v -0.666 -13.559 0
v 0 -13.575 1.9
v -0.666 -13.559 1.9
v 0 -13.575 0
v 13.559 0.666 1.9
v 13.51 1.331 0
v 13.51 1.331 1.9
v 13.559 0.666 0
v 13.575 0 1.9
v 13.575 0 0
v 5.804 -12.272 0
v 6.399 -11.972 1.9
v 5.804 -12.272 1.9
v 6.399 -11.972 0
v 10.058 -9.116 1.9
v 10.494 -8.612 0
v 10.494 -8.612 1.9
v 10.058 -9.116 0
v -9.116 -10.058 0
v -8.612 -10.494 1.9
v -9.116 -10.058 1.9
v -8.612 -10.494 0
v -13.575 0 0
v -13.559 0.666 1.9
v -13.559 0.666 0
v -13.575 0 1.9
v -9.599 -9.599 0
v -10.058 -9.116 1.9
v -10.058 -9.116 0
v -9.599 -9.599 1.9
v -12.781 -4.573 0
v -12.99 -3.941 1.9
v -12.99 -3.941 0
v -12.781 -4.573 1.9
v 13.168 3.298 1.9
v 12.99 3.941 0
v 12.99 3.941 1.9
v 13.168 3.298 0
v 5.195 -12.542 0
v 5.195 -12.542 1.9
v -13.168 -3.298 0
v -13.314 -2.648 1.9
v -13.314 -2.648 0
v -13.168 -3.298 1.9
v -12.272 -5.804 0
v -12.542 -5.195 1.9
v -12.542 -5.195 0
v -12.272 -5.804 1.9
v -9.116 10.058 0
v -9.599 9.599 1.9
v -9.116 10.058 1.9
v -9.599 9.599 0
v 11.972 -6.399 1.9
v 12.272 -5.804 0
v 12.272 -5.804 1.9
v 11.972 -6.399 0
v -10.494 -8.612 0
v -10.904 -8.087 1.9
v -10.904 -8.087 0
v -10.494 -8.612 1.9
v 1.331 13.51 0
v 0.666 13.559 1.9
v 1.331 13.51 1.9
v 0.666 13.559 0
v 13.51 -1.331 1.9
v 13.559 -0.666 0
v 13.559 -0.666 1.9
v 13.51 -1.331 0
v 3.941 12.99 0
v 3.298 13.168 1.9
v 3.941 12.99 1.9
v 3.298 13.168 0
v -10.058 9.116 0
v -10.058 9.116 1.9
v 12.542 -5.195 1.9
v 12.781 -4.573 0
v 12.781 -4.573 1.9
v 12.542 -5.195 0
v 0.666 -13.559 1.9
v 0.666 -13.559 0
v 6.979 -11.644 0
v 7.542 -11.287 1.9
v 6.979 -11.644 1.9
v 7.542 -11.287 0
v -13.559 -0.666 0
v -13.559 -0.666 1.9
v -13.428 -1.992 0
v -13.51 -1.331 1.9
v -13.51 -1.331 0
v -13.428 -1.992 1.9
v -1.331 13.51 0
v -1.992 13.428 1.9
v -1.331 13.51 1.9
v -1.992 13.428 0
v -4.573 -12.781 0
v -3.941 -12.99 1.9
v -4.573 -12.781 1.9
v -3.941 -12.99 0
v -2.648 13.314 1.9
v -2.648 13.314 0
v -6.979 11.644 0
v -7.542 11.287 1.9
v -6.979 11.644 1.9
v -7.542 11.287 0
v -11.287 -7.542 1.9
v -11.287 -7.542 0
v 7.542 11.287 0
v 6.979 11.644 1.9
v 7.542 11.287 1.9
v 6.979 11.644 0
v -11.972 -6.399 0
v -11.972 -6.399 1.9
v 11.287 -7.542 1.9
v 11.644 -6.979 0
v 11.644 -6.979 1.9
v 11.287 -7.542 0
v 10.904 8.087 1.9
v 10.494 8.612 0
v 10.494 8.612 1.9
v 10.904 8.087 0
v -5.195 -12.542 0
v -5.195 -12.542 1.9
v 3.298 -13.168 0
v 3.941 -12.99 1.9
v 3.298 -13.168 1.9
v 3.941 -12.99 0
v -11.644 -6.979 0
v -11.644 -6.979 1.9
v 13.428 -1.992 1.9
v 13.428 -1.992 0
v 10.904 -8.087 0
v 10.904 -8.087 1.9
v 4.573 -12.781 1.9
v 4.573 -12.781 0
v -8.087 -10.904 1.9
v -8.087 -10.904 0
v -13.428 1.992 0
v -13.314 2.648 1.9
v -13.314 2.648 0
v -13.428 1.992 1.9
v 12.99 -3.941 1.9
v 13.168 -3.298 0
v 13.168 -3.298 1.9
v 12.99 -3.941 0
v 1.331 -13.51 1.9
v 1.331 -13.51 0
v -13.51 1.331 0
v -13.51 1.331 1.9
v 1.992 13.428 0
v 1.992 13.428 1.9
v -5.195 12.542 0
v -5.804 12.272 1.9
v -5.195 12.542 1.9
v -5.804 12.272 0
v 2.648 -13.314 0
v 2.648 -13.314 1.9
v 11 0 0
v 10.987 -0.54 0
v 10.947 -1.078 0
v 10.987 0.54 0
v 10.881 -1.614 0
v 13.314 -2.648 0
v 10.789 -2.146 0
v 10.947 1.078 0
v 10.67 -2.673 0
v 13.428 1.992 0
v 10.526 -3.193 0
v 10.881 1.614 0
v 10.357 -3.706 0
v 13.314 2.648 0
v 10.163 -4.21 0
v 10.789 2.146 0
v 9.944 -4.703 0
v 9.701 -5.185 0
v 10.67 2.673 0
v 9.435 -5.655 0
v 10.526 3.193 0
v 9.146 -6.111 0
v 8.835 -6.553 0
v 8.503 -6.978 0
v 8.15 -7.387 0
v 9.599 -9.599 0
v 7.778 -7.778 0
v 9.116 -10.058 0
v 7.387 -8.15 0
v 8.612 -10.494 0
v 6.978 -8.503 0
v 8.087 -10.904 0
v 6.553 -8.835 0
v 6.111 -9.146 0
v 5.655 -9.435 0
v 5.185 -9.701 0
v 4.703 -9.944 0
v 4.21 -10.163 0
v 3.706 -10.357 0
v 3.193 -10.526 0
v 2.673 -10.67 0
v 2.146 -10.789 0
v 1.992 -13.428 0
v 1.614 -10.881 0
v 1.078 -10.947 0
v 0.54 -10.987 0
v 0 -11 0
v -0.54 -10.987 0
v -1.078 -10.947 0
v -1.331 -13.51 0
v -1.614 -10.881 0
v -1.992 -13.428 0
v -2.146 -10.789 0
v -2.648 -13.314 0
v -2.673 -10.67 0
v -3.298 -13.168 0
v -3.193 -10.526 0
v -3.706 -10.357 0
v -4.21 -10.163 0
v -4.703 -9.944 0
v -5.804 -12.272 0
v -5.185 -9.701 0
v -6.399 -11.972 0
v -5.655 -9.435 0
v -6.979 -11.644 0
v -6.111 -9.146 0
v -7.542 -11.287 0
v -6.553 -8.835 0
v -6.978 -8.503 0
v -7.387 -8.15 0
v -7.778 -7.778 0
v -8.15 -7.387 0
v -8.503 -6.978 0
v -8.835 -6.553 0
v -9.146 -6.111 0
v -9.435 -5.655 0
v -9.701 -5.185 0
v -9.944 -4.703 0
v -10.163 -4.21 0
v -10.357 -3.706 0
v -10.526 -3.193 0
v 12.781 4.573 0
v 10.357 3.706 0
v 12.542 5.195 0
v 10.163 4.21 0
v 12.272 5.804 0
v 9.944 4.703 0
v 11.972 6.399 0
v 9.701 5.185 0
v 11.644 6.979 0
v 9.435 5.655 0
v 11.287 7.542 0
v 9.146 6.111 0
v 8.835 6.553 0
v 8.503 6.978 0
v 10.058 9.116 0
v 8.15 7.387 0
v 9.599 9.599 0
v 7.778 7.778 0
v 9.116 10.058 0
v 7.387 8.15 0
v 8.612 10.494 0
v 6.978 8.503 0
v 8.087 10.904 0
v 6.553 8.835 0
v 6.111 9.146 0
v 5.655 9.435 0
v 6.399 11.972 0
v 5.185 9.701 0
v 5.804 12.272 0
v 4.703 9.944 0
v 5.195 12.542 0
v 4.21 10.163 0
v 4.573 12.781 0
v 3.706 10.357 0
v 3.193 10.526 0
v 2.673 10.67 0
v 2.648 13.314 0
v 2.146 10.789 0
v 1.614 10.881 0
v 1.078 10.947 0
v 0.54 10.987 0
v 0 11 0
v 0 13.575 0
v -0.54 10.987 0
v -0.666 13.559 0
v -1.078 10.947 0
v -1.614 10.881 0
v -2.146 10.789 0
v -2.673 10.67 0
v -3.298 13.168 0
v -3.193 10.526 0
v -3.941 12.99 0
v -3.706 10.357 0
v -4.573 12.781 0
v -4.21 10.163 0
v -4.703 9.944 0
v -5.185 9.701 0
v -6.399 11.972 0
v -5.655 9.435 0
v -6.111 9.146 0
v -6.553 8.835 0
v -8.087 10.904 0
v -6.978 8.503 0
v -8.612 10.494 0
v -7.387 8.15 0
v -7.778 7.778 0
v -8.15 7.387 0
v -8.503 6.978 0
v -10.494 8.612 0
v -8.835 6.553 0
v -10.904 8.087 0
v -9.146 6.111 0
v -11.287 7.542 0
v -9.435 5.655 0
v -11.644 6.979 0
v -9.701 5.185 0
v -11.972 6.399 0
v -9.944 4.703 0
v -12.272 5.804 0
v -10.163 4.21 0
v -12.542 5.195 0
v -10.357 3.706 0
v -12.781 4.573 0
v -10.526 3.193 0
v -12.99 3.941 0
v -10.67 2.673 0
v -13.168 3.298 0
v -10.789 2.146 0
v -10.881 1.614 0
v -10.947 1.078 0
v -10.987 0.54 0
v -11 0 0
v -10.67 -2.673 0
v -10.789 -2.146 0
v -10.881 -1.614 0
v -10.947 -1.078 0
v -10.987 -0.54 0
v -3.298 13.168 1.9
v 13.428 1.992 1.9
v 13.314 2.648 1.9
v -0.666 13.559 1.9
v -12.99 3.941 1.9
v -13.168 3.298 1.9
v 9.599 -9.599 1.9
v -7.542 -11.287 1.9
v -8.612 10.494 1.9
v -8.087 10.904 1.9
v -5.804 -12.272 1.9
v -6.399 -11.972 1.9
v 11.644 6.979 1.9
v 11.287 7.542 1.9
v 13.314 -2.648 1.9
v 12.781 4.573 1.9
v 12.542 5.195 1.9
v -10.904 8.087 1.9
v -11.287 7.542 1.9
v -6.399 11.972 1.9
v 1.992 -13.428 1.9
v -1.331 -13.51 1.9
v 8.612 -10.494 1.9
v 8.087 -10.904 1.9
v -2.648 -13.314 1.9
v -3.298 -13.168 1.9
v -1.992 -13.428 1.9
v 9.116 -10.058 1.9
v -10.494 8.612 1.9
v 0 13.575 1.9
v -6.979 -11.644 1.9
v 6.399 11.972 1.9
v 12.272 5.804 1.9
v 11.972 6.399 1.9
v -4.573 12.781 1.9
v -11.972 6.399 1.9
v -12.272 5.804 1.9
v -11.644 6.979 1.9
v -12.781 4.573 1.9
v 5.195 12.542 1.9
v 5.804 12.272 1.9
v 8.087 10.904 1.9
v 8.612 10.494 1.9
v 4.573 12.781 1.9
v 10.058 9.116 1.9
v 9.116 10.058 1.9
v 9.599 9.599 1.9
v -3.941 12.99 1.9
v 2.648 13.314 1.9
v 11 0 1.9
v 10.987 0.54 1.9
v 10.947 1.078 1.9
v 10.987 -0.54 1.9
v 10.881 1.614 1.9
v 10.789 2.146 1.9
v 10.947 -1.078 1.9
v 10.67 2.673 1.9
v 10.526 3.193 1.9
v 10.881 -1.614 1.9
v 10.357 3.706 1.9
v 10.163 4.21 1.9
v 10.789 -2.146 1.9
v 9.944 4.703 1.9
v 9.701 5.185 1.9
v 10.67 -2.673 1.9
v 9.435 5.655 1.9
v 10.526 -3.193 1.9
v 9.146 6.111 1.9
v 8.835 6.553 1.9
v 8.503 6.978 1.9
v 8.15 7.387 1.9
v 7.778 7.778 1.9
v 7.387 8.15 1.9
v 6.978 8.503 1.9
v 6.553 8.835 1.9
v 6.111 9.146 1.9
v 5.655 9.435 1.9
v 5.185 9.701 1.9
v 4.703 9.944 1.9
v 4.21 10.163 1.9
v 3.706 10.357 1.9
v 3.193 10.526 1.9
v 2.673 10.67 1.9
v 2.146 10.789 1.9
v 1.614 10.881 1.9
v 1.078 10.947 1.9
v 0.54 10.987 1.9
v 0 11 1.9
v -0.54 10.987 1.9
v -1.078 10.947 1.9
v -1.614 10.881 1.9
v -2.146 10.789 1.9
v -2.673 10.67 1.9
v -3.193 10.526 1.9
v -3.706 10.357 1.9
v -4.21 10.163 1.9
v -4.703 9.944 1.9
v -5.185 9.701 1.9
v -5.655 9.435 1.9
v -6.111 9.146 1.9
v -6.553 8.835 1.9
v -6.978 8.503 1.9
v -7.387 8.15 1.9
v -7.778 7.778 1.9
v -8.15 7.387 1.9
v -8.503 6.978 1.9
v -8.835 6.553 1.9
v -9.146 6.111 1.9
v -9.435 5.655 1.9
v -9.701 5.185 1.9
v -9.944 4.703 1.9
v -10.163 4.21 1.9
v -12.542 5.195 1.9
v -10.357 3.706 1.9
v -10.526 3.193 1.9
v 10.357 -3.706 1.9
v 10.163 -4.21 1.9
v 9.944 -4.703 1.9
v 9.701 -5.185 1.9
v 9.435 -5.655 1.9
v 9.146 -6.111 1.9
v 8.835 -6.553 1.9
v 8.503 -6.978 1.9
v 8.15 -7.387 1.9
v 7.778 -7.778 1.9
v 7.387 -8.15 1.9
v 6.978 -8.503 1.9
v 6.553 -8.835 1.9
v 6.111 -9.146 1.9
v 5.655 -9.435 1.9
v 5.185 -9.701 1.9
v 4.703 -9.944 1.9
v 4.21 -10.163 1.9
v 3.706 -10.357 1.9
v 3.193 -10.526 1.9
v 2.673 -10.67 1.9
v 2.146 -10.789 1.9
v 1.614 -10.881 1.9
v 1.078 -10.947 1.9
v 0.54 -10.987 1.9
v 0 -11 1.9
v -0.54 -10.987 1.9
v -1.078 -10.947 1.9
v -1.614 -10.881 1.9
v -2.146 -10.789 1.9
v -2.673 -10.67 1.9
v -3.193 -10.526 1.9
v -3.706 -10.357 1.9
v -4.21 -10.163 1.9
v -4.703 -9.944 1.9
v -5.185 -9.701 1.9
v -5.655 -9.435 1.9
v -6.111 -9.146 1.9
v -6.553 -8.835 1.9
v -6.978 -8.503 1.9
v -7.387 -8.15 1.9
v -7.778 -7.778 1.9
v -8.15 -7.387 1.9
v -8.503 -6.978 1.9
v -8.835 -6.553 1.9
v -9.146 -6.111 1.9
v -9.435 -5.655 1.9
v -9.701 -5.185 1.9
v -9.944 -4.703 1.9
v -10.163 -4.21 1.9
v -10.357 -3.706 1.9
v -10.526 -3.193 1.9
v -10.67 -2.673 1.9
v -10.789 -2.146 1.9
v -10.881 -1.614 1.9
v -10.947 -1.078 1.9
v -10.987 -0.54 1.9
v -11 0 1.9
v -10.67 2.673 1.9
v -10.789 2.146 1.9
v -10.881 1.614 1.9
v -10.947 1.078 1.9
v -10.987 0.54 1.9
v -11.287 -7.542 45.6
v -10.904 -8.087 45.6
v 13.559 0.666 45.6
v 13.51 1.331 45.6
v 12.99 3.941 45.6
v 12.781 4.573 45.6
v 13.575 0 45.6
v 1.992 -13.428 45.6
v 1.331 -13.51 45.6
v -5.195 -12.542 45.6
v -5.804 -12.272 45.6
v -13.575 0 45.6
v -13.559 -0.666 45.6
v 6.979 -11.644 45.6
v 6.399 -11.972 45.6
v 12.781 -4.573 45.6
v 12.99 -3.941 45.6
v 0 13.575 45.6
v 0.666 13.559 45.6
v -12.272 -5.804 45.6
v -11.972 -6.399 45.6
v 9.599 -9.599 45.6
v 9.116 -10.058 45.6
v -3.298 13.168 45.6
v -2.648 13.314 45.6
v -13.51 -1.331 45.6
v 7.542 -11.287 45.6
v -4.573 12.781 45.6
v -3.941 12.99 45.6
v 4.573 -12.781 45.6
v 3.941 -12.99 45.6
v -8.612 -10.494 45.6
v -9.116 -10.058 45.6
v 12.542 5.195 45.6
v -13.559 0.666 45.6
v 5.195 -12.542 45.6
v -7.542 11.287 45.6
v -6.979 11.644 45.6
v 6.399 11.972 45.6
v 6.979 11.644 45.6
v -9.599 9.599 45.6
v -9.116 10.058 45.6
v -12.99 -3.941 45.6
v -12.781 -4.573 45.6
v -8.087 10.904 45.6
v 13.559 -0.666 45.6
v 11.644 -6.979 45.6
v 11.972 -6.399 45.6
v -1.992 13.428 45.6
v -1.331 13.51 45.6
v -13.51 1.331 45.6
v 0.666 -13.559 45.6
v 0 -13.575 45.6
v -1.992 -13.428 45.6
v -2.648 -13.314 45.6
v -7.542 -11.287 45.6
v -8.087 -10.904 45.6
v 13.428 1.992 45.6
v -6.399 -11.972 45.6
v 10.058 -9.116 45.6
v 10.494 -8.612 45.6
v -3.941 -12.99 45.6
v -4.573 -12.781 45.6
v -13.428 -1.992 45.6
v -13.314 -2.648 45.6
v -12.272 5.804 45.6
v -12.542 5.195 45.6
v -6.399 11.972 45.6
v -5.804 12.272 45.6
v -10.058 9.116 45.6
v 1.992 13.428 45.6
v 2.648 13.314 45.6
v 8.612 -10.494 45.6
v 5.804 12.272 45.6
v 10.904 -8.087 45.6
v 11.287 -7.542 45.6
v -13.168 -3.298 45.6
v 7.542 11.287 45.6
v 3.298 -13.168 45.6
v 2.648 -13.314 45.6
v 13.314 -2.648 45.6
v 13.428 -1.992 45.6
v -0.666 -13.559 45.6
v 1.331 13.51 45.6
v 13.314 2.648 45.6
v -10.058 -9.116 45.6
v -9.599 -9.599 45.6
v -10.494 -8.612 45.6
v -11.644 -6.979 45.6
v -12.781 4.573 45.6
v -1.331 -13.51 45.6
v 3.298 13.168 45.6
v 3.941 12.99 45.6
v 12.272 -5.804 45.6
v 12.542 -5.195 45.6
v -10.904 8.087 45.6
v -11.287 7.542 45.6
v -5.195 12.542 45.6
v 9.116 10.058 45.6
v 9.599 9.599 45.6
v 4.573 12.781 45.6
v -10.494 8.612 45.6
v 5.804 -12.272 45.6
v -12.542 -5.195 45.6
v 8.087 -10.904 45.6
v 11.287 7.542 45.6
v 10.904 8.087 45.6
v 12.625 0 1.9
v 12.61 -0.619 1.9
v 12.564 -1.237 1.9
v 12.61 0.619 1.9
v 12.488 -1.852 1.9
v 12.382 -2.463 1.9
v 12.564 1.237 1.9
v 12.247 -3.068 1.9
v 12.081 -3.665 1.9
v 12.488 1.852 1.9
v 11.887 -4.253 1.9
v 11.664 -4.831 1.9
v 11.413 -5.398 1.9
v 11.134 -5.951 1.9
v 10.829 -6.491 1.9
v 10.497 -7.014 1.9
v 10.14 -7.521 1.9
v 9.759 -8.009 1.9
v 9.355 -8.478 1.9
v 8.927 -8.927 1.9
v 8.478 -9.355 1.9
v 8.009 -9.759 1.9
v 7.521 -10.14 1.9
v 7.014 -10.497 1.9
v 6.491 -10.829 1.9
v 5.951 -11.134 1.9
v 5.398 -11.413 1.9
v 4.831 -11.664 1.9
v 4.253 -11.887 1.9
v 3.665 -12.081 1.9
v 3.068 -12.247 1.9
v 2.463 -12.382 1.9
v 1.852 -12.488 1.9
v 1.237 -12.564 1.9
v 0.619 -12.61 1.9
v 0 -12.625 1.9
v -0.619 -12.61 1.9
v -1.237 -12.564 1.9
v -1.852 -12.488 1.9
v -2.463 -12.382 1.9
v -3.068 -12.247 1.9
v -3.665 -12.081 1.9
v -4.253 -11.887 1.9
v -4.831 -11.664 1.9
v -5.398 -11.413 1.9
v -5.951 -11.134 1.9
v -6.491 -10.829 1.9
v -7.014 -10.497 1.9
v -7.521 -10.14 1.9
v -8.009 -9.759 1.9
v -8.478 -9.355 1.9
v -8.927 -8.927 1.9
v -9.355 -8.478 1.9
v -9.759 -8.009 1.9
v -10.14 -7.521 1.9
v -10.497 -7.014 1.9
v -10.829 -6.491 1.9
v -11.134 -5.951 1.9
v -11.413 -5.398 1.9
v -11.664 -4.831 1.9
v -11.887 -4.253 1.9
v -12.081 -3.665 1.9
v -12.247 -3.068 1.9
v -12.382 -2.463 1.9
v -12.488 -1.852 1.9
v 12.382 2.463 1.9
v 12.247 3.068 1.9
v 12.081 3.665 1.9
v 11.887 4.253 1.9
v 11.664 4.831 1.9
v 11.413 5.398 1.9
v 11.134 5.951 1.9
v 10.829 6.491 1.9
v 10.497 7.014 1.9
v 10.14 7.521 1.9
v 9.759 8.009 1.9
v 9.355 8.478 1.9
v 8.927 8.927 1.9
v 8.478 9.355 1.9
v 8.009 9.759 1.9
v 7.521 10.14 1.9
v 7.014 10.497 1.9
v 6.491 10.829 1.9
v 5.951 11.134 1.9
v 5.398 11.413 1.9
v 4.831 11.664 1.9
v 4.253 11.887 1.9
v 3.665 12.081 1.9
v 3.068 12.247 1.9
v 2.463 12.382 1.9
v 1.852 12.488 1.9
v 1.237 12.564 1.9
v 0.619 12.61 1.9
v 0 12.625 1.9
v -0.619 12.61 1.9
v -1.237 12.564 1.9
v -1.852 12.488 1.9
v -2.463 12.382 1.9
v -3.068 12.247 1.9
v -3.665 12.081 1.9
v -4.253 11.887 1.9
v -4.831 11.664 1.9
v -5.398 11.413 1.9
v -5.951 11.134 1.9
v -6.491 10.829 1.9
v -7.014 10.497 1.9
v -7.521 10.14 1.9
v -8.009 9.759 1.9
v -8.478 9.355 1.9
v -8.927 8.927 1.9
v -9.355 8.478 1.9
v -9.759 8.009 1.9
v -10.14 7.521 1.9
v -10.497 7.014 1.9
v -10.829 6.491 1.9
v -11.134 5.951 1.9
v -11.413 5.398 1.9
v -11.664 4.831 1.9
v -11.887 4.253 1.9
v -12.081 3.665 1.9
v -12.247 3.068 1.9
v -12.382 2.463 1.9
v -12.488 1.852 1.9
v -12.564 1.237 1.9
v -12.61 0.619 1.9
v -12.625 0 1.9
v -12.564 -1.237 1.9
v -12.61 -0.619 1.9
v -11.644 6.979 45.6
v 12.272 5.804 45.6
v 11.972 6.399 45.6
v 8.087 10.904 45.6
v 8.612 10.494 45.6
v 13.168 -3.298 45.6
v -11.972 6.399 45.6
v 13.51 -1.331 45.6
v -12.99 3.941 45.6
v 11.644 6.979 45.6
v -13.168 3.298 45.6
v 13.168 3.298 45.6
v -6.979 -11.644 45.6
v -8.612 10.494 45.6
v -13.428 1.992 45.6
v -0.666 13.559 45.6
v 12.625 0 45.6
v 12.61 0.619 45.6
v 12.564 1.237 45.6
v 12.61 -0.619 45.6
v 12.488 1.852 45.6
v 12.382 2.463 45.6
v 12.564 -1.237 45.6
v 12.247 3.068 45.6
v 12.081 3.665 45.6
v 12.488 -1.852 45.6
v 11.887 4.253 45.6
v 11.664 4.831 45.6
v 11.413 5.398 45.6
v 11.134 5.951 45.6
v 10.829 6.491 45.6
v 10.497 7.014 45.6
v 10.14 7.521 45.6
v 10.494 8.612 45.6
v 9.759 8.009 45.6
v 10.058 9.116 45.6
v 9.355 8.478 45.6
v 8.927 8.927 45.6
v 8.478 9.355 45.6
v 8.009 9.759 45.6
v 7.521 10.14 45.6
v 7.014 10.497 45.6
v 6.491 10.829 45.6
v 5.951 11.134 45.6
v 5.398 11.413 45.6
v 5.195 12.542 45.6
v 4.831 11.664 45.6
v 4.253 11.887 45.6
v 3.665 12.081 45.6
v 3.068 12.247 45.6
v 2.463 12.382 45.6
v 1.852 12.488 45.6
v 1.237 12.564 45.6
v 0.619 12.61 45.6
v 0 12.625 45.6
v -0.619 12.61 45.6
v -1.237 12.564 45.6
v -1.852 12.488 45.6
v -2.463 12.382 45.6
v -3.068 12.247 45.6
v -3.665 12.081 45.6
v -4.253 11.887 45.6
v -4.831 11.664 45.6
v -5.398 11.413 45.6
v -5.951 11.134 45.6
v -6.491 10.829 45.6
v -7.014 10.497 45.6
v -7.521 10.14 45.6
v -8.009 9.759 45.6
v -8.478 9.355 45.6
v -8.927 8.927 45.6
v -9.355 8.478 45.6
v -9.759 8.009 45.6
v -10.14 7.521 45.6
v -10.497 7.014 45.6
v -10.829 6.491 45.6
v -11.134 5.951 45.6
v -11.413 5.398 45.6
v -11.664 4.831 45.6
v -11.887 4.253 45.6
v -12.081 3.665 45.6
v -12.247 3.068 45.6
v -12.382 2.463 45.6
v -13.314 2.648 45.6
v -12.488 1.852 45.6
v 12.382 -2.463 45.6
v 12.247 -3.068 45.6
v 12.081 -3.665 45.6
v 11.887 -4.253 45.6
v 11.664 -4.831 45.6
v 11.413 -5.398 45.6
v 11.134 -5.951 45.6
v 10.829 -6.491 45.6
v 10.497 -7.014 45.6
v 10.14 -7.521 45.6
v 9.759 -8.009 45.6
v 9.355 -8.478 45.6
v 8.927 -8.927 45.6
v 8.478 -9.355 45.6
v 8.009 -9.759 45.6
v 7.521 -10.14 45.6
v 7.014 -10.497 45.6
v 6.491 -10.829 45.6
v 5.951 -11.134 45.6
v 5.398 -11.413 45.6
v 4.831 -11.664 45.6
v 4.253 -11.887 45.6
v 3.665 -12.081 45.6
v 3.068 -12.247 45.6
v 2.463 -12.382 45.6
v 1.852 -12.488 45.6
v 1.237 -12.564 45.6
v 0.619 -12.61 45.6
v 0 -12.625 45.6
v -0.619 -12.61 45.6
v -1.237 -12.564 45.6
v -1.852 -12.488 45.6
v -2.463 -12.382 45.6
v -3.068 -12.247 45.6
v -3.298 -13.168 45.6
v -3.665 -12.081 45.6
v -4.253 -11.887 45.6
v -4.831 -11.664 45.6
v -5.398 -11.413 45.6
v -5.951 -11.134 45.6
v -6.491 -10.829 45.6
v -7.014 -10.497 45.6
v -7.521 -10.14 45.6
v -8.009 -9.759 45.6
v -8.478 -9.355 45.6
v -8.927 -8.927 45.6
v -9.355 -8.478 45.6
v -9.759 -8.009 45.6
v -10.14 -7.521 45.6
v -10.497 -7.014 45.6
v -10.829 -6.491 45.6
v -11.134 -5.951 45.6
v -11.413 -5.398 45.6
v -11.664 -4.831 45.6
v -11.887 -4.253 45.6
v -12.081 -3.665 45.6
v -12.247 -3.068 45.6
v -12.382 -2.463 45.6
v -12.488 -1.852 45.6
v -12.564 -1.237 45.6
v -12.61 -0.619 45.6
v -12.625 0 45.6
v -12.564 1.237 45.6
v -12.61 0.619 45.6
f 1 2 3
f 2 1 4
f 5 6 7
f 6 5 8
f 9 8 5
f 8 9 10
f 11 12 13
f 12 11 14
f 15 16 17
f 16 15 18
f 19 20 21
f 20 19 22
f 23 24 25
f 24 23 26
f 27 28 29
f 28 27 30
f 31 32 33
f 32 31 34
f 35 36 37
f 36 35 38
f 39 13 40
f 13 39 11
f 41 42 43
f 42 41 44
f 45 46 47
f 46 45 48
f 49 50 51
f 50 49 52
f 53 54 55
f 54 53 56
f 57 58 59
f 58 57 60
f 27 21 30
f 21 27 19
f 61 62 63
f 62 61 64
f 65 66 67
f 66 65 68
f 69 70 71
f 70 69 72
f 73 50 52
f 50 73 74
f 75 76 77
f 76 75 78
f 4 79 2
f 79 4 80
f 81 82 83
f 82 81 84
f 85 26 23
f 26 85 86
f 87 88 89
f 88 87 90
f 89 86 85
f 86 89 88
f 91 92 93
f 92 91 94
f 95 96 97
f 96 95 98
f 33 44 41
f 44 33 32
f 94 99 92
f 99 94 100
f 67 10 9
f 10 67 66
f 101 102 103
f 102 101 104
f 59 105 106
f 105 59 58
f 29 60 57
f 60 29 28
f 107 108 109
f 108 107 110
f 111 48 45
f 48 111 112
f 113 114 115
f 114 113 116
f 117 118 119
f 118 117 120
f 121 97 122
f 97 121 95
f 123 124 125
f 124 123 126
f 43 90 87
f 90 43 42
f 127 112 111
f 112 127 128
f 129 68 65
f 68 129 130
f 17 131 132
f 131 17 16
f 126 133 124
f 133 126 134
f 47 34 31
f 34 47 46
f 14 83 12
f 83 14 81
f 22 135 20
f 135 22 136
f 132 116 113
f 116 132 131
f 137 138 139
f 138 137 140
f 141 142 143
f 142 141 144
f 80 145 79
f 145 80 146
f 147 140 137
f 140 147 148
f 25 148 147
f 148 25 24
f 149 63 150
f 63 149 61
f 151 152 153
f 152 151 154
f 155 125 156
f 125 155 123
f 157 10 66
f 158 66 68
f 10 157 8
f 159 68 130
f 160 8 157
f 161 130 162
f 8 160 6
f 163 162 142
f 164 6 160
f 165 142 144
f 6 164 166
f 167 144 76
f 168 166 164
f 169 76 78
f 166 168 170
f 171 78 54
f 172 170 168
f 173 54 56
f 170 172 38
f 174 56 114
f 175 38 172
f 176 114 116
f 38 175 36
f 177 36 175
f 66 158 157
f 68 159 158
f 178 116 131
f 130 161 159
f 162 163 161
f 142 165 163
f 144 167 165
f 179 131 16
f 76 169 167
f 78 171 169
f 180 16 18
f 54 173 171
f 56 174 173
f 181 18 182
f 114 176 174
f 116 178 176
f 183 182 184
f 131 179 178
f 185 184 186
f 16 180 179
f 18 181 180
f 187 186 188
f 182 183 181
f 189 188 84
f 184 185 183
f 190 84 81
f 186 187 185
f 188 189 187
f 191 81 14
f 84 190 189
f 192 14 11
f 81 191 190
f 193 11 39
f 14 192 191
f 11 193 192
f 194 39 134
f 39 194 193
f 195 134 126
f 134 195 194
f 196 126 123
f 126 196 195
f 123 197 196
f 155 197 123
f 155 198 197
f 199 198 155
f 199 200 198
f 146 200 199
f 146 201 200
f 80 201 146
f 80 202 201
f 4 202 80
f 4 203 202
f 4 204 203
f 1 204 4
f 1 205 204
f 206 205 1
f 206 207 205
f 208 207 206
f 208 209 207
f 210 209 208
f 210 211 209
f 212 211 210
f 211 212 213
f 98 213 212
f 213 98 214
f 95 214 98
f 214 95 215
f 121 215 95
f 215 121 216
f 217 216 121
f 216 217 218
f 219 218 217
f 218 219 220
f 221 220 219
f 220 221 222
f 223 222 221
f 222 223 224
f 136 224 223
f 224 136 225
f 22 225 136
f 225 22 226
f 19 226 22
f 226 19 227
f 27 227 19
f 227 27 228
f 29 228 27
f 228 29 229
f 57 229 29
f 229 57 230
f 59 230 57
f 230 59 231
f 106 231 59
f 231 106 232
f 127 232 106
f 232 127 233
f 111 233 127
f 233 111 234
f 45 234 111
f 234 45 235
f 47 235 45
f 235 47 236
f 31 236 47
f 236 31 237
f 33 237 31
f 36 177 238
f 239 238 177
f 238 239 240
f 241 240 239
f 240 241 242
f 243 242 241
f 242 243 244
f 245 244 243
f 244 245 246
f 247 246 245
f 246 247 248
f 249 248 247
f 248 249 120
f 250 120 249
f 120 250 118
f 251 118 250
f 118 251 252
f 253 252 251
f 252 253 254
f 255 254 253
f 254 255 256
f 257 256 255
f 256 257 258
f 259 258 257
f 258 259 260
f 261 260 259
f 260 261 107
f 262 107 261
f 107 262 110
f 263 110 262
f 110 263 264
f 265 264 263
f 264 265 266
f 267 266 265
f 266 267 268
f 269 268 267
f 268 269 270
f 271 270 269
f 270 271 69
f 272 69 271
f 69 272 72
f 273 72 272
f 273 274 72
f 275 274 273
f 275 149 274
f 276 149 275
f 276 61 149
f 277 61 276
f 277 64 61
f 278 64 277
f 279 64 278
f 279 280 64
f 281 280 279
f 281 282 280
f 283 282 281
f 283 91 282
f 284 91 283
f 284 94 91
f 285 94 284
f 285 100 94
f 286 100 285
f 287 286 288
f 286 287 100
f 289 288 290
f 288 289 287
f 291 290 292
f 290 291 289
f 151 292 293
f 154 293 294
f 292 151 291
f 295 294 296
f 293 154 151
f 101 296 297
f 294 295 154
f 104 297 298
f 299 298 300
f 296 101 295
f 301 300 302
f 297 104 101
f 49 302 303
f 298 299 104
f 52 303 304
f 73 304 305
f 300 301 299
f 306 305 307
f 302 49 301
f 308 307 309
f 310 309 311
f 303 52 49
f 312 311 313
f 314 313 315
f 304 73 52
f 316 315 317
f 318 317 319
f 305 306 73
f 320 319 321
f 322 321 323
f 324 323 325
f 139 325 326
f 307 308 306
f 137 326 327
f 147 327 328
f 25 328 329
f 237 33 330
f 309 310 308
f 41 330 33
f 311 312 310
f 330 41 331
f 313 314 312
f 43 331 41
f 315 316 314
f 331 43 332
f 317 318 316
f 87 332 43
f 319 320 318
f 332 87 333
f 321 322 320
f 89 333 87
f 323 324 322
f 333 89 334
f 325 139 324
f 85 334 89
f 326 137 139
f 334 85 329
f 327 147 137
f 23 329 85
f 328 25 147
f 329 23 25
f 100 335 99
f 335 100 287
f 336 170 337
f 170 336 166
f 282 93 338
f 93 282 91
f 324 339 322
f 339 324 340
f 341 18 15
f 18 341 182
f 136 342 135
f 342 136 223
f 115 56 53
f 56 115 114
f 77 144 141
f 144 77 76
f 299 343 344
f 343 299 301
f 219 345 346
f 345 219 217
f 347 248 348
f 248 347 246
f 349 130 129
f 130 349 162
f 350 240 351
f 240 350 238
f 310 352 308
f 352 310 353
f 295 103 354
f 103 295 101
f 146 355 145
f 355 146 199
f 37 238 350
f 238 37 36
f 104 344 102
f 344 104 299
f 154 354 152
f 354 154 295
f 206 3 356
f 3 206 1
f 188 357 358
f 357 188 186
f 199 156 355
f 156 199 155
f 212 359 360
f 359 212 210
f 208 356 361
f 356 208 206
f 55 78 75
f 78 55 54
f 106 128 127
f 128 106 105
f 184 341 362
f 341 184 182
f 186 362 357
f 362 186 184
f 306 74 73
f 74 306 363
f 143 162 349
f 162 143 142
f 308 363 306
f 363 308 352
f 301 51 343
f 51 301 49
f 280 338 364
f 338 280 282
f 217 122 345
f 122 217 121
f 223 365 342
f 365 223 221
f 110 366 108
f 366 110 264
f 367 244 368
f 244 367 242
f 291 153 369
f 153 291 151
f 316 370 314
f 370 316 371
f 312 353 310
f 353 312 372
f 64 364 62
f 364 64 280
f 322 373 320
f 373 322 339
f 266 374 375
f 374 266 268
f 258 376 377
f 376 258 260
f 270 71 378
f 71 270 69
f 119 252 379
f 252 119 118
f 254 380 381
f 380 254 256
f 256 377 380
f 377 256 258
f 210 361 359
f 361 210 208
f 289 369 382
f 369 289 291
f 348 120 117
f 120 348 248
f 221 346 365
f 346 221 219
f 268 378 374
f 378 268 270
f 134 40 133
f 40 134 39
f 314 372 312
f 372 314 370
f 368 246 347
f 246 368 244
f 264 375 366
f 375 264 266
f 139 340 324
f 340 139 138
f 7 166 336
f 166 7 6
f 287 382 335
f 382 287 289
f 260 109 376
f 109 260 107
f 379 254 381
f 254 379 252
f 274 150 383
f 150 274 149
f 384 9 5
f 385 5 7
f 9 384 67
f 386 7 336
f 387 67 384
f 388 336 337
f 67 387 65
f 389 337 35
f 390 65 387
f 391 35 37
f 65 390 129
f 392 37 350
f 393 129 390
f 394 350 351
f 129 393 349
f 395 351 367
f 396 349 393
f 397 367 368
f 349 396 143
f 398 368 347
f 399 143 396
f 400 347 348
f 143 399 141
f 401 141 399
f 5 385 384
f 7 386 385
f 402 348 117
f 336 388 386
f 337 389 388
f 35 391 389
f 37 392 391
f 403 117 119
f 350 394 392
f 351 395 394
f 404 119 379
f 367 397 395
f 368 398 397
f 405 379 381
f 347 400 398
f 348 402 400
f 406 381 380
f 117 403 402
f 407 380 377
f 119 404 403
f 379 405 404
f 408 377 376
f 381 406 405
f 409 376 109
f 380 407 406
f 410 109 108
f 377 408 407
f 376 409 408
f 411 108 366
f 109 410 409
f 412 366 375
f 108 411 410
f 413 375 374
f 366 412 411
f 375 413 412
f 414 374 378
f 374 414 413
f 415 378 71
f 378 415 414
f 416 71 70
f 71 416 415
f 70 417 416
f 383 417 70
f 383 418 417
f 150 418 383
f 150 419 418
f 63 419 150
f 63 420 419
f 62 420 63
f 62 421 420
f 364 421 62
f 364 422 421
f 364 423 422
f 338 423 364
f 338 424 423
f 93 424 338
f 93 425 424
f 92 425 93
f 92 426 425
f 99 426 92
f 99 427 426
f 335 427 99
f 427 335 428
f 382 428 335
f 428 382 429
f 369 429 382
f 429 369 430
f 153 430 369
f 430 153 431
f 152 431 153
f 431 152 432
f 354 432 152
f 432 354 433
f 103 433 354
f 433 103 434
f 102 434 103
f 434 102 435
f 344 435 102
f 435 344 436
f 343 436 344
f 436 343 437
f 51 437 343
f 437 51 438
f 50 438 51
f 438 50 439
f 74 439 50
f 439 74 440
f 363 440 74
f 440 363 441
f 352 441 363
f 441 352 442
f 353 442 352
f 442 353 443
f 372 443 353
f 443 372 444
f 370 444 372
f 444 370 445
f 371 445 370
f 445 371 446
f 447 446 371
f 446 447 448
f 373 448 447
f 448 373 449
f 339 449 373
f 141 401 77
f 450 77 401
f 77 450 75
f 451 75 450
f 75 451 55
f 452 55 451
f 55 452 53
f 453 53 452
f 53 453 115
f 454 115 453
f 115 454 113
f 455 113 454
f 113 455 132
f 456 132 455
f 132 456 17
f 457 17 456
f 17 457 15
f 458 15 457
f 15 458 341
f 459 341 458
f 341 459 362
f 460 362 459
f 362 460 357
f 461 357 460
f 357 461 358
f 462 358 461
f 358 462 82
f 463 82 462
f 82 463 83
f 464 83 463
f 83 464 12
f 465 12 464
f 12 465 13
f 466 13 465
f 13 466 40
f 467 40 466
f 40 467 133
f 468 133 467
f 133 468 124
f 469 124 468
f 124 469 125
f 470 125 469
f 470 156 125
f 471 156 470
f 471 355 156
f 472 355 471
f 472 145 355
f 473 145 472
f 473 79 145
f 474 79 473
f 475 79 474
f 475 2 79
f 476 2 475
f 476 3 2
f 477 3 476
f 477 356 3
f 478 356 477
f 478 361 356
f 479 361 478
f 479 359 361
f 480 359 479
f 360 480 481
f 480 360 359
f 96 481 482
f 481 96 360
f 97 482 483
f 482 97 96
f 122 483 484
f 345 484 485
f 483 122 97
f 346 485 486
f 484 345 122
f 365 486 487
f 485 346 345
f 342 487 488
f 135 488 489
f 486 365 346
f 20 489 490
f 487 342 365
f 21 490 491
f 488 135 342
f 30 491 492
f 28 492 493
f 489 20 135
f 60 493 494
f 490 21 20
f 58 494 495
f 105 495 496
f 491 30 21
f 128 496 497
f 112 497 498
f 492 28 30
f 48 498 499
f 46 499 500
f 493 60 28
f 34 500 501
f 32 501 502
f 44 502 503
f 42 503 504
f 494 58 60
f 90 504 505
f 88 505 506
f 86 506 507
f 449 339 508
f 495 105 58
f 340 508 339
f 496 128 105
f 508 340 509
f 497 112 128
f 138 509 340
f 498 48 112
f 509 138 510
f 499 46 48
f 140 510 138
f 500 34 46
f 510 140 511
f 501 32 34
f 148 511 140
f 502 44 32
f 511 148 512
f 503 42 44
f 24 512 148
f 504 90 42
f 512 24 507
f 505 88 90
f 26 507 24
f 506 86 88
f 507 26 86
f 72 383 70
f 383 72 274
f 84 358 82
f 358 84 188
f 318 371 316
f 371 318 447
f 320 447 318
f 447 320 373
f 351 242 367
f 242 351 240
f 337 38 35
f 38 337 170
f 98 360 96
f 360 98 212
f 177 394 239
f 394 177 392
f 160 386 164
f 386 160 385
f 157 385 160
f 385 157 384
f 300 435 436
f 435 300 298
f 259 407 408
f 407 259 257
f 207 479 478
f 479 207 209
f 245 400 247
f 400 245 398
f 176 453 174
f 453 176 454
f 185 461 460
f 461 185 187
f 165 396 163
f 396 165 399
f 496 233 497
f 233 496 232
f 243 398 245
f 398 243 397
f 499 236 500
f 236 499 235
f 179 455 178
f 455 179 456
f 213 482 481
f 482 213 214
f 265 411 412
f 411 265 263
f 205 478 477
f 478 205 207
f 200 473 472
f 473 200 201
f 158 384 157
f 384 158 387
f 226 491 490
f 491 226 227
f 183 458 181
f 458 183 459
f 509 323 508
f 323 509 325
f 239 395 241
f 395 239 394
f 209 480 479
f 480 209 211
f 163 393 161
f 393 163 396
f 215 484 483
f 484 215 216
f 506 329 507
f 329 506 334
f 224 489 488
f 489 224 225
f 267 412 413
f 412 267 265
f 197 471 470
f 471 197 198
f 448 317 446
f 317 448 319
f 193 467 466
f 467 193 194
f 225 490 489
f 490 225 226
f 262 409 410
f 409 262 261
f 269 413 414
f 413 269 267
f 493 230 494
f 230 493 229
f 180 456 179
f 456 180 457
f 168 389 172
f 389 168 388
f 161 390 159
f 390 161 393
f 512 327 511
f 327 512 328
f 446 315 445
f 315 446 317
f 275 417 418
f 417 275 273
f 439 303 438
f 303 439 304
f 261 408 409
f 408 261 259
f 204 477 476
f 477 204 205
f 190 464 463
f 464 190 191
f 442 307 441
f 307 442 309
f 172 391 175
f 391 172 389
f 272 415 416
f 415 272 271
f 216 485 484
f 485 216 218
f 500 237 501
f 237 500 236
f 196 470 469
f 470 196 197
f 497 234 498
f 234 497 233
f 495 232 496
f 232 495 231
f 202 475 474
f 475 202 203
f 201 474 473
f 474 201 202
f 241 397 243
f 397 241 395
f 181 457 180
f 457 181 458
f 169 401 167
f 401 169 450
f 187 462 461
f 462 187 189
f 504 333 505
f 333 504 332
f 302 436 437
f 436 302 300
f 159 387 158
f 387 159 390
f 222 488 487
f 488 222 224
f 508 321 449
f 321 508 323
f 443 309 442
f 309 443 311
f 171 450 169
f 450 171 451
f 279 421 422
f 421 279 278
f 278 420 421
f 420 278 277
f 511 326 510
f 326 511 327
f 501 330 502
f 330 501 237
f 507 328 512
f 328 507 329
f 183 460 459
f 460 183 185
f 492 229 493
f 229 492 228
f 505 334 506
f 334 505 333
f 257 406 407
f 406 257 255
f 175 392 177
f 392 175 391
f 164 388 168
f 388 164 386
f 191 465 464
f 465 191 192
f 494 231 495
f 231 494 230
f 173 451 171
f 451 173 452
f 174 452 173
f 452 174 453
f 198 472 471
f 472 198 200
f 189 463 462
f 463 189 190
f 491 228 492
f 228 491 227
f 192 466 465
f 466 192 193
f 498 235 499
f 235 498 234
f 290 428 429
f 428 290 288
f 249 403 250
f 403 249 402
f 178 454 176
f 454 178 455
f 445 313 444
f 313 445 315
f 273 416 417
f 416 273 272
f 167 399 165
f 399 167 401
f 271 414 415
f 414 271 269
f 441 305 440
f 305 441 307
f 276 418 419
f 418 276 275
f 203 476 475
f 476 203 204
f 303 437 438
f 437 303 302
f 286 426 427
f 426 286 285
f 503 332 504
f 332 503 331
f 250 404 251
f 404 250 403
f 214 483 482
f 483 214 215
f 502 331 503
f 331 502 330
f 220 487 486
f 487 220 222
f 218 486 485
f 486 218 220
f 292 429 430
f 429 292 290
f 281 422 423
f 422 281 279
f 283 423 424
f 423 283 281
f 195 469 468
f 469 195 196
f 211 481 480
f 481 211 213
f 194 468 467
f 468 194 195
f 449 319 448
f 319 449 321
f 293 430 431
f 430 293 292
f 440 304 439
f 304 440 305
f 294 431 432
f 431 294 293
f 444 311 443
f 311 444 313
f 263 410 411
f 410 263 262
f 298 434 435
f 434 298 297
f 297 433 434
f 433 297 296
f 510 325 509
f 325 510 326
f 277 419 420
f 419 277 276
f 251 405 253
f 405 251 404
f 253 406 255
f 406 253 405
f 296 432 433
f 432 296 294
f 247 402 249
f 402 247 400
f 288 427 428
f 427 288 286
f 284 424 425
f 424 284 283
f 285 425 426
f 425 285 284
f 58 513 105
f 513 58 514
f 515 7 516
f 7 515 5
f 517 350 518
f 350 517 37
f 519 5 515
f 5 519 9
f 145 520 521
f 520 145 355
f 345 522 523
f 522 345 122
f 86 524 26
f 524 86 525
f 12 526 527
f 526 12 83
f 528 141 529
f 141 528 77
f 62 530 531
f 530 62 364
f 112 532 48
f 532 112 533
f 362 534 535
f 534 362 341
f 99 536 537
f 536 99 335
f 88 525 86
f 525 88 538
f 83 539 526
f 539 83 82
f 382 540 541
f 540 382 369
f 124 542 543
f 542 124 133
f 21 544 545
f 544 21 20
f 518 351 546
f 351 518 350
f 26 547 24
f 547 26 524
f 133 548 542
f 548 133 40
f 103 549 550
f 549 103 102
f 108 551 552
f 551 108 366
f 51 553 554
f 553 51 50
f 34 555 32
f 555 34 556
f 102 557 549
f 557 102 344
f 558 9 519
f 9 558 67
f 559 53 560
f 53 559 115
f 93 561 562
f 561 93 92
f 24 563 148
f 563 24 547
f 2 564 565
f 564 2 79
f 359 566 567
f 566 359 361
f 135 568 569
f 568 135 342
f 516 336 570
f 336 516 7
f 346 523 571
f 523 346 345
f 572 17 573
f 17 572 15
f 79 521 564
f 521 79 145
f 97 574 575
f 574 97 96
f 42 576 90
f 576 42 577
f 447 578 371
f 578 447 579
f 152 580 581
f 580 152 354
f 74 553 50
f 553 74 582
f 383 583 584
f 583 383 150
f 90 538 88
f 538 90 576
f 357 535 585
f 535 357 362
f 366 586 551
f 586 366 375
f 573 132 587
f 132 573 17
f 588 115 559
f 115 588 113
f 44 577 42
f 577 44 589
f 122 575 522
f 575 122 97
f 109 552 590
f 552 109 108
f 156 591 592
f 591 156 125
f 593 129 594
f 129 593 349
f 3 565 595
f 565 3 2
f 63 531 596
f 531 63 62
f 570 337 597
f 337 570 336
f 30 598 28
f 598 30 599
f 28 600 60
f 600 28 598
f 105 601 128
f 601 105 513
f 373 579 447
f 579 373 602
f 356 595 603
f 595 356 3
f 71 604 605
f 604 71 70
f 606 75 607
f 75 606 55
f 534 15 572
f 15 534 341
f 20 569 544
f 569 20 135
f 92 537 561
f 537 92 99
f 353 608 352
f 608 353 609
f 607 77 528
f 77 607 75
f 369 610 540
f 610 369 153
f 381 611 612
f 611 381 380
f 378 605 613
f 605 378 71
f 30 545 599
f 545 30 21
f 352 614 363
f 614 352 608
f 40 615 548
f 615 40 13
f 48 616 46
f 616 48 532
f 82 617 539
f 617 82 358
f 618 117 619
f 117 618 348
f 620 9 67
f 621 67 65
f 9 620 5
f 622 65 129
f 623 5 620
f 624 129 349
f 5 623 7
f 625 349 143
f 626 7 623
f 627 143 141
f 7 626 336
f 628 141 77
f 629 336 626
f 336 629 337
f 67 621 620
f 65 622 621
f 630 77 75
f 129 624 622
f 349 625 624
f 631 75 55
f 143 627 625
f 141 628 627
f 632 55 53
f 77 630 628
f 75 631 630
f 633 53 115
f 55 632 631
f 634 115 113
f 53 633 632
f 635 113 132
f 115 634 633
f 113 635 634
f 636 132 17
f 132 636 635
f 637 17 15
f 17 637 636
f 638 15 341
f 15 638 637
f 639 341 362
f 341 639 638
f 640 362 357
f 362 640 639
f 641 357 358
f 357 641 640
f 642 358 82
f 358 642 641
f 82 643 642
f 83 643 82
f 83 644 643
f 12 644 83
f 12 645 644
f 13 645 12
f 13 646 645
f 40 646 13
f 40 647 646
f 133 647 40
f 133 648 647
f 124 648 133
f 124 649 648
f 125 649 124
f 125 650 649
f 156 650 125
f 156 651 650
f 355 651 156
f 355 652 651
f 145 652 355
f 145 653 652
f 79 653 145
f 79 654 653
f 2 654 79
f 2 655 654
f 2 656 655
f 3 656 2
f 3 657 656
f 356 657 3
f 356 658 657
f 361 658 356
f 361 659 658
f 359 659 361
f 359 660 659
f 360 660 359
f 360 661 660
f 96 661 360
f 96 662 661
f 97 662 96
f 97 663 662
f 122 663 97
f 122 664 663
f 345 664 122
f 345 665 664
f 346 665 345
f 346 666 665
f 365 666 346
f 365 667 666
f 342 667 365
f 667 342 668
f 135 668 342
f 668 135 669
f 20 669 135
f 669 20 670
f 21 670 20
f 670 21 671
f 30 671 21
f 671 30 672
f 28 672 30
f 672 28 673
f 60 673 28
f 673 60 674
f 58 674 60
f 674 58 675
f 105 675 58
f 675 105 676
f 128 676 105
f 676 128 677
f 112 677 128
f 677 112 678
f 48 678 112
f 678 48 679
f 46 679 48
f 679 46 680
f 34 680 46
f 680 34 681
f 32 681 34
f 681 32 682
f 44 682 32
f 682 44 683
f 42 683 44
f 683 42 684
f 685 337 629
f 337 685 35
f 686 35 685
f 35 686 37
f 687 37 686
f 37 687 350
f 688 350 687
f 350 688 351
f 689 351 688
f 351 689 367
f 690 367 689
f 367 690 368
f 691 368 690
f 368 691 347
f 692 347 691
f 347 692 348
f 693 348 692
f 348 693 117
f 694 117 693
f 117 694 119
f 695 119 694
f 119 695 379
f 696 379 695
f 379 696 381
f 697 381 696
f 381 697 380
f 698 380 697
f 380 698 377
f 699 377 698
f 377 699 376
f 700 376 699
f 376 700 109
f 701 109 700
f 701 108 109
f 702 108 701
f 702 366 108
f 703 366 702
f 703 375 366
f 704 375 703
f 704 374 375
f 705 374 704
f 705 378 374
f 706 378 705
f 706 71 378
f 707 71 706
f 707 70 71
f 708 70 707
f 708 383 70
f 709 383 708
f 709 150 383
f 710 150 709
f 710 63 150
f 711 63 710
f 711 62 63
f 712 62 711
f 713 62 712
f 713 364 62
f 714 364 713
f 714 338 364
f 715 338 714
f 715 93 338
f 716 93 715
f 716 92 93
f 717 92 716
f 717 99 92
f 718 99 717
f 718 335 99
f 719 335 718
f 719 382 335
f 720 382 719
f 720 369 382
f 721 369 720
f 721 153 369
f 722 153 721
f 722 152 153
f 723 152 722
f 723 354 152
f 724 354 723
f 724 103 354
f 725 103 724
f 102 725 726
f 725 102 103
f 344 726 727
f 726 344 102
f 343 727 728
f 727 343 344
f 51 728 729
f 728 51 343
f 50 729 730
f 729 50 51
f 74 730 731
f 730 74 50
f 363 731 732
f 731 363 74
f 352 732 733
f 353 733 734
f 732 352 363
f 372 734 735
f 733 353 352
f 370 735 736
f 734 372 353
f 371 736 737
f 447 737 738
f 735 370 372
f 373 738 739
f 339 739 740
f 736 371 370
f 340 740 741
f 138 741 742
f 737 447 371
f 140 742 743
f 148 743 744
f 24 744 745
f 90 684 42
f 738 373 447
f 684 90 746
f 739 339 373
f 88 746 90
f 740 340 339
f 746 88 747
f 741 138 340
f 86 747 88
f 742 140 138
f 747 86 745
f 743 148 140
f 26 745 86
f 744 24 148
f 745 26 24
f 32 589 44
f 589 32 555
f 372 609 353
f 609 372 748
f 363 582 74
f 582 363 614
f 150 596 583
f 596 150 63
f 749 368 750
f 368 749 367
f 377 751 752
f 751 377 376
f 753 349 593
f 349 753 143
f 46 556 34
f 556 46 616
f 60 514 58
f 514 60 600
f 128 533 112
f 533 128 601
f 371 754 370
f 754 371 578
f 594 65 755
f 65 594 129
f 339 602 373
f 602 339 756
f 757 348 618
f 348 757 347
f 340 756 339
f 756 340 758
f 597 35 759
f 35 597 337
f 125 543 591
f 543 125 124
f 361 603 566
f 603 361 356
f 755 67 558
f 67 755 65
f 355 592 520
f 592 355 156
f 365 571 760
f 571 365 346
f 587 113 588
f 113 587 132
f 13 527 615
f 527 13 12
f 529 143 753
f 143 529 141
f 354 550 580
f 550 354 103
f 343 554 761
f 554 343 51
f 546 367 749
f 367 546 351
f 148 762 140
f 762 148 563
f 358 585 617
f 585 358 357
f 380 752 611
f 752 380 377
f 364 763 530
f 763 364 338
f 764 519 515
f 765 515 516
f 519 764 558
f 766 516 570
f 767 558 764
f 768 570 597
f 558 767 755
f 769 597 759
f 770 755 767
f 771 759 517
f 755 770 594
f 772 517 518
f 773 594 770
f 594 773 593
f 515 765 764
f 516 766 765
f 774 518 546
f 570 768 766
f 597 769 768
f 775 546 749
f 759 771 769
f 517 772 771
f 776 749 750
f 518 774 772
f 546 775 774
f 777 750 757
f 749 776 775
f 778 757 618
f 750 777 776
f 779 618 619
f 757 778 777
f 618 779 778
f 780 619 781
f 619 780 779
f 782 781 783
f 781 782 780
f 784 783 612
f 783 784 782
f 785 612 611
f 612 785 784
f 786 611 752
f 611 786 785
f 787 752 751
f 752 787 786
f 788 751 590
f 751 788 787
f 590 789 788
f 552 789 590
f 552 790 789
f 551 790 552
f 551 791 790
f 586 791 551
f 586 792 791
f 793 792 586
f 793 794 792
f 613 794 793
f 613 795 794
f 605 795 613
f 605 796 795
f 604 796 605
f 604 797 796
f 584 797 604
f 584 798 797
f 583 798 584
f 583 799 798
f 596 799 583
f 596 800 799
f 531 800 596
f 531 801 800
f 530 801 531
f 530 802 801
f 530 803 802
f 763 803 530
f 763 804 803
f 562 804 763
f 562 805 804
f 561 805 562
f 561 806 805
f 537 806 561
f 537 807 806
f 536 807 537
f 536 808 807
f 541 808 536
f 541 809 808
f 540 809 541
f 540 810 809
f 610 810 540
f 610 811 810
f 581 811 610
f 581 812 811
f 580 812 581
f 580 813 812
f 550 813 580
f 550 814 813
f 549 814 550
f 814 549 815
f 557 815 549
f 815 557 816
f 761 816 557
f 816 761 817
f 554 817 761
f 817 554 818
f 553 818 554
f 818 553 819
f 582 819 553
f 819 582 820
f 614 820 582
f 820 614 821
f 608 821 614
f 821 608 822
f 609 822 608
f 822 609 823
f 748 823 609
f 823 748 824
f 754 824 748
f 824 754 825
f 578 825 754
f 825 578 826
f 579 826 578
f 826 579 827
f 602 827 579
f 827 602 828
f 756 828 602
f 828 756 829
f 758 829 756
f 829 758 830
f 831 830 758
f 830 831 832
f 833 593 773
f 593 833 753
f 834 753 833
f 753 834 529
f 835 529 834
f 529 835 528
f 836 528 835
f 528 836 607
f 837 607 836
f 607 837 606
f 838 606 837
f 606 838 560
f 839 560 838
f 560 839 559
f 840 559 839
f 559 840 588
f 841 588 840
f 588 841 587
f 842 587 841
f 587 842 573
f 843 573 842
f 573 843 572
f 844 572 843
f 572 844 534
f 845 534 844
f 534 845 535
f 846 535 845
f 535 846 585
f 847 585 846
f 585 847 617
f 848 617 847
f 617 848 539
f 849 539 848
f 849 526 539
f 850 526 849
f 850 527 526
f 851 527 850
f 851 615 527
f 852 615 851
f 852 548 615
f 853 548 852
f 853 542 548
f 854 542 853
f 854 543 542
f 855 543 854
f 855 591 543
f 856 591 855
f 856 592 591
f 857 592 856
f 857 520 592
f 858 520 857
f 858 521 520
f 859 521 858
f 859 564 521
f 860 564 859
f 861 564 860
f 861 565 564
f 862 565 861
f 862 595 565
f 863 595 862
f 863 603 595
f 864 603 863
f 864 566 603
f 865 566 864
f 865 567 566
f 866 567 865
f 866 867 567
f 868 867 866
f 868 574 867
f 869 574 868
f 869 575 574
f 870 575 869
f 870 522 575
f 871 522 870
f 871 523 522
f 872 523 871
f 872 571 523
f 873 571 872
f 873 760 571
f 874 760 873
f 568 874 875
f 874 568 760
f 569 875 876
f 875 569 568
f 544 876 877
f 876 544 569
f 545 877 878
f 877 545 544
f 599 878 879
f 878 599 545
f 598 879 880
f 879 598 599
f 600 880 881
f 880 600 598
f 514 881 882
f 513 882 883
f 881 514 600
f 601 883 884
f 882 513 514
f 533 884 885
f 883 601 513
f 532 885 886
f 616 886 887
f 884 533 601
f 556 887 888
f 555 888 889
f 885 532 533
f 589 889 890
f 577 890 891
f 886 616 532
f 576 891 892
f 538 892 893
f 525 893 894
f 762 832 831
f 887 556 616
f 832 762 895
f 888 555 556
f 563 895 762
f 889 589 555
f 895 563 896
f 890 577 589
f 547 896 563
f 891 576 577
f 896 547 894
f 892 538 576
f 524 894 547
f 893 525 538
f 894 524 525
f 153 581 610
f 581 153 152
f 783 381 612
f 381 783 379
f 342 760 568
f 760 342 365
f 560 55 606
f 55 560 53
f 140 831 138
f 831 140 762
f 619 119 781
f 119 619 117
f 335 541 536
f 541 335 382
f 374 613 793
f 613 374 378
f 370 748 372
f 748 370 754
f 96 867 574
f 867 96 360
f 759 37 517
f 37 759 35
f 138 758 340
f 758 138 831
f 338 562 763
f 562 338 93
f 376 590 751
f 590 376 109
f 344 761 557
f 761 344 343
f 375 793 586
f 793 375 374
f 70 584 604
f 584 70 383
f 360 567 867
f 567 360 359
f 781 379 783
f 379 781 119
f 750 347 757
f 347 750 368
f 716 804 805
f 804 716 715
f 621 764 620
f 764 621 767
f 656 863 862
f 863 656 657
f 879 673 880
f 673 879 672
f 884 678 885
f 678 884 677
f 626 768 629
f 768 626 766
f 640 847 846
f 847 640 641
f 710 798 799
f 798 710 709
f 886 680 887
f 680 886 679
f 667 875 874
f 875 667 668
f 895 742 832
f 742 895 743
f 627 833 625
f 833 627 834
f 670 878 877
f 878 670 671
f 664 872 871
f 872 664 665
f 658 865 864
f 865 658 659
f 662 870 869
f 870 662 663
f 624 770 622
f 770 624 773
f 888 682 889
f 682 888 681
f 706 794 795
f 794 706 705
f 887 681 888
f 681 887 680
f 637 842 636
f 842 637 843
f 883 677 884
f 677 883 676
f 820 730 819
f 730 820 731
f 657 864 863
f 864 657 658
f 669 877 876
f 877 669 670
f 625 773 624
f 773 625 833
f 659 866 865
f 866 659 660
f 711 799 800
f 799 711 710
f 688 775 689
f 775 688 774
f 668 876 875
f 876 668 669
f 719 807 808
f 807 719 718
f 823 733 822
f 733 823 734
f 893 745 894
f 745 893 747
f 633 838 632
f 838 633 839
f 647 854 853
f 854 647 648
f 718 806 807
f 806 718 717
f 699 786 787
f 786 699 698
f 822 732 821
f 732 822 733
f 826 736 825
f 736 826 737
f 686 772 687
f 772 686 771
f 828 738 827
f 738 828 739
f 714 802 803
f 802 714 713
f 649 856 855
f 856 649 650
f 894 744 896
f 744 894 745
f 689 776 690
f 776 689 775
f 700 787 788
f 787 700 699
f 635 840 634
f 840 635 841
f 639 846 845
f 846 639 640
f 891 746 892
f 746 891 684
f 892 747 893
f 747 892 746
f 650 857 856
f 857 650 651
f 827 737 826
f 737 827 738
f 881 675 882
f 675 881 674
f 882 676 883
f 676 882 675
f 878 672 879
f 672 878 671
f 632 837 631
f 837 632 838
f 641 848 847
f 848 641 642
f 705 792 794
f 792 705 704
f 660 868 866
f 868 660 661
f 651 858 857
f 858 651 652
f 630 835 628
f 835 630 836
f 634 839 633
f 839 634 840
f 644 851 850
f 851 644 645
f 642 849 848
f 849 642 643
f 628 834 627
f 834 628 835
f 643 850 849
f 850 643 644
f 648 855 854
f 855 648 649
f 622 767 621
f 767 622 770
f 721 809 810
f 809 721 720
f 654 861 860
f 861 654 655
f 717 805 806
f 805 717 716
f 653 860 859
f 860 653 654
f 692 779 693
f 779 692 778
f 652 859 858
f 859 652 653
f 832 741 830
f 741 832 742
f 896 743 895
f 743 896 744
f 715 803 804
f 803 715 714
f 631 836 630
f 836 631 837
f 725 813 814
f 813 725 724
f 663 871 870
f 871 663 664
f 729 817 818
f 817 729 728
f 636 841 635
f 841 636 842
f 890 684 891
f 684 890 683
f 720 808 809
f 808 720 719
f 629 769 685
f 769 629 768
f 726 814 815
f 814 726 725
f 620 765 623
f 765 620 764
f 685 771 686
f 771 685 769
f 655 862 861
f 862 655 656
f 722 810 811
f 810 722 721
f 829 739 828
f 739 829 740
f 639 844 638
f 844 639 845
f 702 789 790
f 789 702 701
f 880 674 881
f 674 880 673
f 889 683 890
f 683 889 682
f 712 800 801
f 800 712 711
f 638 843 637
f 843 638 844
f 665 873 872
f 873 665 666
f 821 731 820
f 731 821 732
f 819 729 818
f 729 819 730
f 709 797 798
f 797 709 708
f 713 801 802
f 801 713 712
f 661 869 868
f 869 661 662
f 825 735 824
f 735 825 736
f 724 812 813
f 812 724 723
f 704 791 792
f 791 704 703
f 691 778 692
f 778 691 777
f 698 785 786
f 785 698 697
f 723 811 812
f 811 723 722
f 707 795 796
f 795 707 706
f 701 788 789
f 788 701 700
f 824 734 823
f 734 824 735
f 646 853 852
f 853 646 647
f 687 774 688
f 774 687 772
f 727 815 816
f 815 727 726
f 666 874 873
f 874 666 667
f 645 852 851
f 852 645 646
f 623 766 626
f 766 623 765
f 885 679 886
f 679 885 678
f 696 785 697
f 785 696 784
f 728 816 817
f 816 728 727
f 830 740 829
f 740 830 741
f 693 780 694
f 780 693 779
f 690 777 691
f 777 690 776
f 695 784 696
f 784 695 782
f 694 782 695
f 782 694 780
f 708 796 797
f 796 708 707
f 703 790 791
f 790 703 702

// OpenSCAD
// file: measurements.scad
thickness = 1.9;
finger_d = 22;

module holder(h) {
    // Child 0 is the outer shape
    // Child 1 is the inner shape
    // Child 2 is the end-cap hole shape
    // Bottom end
    difference() {
        linear_extrude(thickness) { children(0); }
        translate([0, 0, -1])
            linear_extrude(thickness+2) { children(2); }
    }
    // Main chamber: h + thickness to leave room for the lid.
    translate([0, 0, thickness])
        difference() {
            linear_extrude(h + thickness) { children(0); }
            translate([0, 0, -1])
                linear_extrude(h + thickness + 2) { children(1); }
        }
}

module lid() {
    // Child 0 is the outer shape
    // Child 1 is the inner shape
    // Child 2 is the end-cap hole shape
    // Bottom end
    difference() {
        linear_extrude(thickness) { children(0); }
        translate([0, 0, -1])
            linear_extrude(thickness+2) { children(2); }
    }
    // Cap plug
    translate([0, 0, thickness])
        difference() {
            linear_extrude(thickness) { children(1); }
            translate([0, 0, -1])
                linear_extrude(thickness+2) { children(2); }
        }
}

//
// Discovery Tiles
//

discovery_w = 24;
discovery_count = 21;

function discovery_corner_r(w) = w * 7 / 24;

module discovery_tile_shape(w) {
    r = discovery_corner_r(w);
    translate([-w/2, -w/2]) {
        translate([w-r, w-r])
            circle(r=r, $fn=64);
        square([w-r, w]);
        square([w, w-r]);
    }
}

//
// Ancients
//

ancient_r = 19.5;
ancient_count = 22;

//
// Monotliths/Orbitals
//

monolith_orbital_d = 25.25;
monolith_orbital_count = 22;
// main file
include <measurements.scad>

holder(monolith_orbital_count*thickness) {
    circle(d=monolith_orbital_d+thickness, $fn=128);
    circle(d=monolith_orbital_d, $fn=128);
    circle(d=finger_d, $fn=128);
}
